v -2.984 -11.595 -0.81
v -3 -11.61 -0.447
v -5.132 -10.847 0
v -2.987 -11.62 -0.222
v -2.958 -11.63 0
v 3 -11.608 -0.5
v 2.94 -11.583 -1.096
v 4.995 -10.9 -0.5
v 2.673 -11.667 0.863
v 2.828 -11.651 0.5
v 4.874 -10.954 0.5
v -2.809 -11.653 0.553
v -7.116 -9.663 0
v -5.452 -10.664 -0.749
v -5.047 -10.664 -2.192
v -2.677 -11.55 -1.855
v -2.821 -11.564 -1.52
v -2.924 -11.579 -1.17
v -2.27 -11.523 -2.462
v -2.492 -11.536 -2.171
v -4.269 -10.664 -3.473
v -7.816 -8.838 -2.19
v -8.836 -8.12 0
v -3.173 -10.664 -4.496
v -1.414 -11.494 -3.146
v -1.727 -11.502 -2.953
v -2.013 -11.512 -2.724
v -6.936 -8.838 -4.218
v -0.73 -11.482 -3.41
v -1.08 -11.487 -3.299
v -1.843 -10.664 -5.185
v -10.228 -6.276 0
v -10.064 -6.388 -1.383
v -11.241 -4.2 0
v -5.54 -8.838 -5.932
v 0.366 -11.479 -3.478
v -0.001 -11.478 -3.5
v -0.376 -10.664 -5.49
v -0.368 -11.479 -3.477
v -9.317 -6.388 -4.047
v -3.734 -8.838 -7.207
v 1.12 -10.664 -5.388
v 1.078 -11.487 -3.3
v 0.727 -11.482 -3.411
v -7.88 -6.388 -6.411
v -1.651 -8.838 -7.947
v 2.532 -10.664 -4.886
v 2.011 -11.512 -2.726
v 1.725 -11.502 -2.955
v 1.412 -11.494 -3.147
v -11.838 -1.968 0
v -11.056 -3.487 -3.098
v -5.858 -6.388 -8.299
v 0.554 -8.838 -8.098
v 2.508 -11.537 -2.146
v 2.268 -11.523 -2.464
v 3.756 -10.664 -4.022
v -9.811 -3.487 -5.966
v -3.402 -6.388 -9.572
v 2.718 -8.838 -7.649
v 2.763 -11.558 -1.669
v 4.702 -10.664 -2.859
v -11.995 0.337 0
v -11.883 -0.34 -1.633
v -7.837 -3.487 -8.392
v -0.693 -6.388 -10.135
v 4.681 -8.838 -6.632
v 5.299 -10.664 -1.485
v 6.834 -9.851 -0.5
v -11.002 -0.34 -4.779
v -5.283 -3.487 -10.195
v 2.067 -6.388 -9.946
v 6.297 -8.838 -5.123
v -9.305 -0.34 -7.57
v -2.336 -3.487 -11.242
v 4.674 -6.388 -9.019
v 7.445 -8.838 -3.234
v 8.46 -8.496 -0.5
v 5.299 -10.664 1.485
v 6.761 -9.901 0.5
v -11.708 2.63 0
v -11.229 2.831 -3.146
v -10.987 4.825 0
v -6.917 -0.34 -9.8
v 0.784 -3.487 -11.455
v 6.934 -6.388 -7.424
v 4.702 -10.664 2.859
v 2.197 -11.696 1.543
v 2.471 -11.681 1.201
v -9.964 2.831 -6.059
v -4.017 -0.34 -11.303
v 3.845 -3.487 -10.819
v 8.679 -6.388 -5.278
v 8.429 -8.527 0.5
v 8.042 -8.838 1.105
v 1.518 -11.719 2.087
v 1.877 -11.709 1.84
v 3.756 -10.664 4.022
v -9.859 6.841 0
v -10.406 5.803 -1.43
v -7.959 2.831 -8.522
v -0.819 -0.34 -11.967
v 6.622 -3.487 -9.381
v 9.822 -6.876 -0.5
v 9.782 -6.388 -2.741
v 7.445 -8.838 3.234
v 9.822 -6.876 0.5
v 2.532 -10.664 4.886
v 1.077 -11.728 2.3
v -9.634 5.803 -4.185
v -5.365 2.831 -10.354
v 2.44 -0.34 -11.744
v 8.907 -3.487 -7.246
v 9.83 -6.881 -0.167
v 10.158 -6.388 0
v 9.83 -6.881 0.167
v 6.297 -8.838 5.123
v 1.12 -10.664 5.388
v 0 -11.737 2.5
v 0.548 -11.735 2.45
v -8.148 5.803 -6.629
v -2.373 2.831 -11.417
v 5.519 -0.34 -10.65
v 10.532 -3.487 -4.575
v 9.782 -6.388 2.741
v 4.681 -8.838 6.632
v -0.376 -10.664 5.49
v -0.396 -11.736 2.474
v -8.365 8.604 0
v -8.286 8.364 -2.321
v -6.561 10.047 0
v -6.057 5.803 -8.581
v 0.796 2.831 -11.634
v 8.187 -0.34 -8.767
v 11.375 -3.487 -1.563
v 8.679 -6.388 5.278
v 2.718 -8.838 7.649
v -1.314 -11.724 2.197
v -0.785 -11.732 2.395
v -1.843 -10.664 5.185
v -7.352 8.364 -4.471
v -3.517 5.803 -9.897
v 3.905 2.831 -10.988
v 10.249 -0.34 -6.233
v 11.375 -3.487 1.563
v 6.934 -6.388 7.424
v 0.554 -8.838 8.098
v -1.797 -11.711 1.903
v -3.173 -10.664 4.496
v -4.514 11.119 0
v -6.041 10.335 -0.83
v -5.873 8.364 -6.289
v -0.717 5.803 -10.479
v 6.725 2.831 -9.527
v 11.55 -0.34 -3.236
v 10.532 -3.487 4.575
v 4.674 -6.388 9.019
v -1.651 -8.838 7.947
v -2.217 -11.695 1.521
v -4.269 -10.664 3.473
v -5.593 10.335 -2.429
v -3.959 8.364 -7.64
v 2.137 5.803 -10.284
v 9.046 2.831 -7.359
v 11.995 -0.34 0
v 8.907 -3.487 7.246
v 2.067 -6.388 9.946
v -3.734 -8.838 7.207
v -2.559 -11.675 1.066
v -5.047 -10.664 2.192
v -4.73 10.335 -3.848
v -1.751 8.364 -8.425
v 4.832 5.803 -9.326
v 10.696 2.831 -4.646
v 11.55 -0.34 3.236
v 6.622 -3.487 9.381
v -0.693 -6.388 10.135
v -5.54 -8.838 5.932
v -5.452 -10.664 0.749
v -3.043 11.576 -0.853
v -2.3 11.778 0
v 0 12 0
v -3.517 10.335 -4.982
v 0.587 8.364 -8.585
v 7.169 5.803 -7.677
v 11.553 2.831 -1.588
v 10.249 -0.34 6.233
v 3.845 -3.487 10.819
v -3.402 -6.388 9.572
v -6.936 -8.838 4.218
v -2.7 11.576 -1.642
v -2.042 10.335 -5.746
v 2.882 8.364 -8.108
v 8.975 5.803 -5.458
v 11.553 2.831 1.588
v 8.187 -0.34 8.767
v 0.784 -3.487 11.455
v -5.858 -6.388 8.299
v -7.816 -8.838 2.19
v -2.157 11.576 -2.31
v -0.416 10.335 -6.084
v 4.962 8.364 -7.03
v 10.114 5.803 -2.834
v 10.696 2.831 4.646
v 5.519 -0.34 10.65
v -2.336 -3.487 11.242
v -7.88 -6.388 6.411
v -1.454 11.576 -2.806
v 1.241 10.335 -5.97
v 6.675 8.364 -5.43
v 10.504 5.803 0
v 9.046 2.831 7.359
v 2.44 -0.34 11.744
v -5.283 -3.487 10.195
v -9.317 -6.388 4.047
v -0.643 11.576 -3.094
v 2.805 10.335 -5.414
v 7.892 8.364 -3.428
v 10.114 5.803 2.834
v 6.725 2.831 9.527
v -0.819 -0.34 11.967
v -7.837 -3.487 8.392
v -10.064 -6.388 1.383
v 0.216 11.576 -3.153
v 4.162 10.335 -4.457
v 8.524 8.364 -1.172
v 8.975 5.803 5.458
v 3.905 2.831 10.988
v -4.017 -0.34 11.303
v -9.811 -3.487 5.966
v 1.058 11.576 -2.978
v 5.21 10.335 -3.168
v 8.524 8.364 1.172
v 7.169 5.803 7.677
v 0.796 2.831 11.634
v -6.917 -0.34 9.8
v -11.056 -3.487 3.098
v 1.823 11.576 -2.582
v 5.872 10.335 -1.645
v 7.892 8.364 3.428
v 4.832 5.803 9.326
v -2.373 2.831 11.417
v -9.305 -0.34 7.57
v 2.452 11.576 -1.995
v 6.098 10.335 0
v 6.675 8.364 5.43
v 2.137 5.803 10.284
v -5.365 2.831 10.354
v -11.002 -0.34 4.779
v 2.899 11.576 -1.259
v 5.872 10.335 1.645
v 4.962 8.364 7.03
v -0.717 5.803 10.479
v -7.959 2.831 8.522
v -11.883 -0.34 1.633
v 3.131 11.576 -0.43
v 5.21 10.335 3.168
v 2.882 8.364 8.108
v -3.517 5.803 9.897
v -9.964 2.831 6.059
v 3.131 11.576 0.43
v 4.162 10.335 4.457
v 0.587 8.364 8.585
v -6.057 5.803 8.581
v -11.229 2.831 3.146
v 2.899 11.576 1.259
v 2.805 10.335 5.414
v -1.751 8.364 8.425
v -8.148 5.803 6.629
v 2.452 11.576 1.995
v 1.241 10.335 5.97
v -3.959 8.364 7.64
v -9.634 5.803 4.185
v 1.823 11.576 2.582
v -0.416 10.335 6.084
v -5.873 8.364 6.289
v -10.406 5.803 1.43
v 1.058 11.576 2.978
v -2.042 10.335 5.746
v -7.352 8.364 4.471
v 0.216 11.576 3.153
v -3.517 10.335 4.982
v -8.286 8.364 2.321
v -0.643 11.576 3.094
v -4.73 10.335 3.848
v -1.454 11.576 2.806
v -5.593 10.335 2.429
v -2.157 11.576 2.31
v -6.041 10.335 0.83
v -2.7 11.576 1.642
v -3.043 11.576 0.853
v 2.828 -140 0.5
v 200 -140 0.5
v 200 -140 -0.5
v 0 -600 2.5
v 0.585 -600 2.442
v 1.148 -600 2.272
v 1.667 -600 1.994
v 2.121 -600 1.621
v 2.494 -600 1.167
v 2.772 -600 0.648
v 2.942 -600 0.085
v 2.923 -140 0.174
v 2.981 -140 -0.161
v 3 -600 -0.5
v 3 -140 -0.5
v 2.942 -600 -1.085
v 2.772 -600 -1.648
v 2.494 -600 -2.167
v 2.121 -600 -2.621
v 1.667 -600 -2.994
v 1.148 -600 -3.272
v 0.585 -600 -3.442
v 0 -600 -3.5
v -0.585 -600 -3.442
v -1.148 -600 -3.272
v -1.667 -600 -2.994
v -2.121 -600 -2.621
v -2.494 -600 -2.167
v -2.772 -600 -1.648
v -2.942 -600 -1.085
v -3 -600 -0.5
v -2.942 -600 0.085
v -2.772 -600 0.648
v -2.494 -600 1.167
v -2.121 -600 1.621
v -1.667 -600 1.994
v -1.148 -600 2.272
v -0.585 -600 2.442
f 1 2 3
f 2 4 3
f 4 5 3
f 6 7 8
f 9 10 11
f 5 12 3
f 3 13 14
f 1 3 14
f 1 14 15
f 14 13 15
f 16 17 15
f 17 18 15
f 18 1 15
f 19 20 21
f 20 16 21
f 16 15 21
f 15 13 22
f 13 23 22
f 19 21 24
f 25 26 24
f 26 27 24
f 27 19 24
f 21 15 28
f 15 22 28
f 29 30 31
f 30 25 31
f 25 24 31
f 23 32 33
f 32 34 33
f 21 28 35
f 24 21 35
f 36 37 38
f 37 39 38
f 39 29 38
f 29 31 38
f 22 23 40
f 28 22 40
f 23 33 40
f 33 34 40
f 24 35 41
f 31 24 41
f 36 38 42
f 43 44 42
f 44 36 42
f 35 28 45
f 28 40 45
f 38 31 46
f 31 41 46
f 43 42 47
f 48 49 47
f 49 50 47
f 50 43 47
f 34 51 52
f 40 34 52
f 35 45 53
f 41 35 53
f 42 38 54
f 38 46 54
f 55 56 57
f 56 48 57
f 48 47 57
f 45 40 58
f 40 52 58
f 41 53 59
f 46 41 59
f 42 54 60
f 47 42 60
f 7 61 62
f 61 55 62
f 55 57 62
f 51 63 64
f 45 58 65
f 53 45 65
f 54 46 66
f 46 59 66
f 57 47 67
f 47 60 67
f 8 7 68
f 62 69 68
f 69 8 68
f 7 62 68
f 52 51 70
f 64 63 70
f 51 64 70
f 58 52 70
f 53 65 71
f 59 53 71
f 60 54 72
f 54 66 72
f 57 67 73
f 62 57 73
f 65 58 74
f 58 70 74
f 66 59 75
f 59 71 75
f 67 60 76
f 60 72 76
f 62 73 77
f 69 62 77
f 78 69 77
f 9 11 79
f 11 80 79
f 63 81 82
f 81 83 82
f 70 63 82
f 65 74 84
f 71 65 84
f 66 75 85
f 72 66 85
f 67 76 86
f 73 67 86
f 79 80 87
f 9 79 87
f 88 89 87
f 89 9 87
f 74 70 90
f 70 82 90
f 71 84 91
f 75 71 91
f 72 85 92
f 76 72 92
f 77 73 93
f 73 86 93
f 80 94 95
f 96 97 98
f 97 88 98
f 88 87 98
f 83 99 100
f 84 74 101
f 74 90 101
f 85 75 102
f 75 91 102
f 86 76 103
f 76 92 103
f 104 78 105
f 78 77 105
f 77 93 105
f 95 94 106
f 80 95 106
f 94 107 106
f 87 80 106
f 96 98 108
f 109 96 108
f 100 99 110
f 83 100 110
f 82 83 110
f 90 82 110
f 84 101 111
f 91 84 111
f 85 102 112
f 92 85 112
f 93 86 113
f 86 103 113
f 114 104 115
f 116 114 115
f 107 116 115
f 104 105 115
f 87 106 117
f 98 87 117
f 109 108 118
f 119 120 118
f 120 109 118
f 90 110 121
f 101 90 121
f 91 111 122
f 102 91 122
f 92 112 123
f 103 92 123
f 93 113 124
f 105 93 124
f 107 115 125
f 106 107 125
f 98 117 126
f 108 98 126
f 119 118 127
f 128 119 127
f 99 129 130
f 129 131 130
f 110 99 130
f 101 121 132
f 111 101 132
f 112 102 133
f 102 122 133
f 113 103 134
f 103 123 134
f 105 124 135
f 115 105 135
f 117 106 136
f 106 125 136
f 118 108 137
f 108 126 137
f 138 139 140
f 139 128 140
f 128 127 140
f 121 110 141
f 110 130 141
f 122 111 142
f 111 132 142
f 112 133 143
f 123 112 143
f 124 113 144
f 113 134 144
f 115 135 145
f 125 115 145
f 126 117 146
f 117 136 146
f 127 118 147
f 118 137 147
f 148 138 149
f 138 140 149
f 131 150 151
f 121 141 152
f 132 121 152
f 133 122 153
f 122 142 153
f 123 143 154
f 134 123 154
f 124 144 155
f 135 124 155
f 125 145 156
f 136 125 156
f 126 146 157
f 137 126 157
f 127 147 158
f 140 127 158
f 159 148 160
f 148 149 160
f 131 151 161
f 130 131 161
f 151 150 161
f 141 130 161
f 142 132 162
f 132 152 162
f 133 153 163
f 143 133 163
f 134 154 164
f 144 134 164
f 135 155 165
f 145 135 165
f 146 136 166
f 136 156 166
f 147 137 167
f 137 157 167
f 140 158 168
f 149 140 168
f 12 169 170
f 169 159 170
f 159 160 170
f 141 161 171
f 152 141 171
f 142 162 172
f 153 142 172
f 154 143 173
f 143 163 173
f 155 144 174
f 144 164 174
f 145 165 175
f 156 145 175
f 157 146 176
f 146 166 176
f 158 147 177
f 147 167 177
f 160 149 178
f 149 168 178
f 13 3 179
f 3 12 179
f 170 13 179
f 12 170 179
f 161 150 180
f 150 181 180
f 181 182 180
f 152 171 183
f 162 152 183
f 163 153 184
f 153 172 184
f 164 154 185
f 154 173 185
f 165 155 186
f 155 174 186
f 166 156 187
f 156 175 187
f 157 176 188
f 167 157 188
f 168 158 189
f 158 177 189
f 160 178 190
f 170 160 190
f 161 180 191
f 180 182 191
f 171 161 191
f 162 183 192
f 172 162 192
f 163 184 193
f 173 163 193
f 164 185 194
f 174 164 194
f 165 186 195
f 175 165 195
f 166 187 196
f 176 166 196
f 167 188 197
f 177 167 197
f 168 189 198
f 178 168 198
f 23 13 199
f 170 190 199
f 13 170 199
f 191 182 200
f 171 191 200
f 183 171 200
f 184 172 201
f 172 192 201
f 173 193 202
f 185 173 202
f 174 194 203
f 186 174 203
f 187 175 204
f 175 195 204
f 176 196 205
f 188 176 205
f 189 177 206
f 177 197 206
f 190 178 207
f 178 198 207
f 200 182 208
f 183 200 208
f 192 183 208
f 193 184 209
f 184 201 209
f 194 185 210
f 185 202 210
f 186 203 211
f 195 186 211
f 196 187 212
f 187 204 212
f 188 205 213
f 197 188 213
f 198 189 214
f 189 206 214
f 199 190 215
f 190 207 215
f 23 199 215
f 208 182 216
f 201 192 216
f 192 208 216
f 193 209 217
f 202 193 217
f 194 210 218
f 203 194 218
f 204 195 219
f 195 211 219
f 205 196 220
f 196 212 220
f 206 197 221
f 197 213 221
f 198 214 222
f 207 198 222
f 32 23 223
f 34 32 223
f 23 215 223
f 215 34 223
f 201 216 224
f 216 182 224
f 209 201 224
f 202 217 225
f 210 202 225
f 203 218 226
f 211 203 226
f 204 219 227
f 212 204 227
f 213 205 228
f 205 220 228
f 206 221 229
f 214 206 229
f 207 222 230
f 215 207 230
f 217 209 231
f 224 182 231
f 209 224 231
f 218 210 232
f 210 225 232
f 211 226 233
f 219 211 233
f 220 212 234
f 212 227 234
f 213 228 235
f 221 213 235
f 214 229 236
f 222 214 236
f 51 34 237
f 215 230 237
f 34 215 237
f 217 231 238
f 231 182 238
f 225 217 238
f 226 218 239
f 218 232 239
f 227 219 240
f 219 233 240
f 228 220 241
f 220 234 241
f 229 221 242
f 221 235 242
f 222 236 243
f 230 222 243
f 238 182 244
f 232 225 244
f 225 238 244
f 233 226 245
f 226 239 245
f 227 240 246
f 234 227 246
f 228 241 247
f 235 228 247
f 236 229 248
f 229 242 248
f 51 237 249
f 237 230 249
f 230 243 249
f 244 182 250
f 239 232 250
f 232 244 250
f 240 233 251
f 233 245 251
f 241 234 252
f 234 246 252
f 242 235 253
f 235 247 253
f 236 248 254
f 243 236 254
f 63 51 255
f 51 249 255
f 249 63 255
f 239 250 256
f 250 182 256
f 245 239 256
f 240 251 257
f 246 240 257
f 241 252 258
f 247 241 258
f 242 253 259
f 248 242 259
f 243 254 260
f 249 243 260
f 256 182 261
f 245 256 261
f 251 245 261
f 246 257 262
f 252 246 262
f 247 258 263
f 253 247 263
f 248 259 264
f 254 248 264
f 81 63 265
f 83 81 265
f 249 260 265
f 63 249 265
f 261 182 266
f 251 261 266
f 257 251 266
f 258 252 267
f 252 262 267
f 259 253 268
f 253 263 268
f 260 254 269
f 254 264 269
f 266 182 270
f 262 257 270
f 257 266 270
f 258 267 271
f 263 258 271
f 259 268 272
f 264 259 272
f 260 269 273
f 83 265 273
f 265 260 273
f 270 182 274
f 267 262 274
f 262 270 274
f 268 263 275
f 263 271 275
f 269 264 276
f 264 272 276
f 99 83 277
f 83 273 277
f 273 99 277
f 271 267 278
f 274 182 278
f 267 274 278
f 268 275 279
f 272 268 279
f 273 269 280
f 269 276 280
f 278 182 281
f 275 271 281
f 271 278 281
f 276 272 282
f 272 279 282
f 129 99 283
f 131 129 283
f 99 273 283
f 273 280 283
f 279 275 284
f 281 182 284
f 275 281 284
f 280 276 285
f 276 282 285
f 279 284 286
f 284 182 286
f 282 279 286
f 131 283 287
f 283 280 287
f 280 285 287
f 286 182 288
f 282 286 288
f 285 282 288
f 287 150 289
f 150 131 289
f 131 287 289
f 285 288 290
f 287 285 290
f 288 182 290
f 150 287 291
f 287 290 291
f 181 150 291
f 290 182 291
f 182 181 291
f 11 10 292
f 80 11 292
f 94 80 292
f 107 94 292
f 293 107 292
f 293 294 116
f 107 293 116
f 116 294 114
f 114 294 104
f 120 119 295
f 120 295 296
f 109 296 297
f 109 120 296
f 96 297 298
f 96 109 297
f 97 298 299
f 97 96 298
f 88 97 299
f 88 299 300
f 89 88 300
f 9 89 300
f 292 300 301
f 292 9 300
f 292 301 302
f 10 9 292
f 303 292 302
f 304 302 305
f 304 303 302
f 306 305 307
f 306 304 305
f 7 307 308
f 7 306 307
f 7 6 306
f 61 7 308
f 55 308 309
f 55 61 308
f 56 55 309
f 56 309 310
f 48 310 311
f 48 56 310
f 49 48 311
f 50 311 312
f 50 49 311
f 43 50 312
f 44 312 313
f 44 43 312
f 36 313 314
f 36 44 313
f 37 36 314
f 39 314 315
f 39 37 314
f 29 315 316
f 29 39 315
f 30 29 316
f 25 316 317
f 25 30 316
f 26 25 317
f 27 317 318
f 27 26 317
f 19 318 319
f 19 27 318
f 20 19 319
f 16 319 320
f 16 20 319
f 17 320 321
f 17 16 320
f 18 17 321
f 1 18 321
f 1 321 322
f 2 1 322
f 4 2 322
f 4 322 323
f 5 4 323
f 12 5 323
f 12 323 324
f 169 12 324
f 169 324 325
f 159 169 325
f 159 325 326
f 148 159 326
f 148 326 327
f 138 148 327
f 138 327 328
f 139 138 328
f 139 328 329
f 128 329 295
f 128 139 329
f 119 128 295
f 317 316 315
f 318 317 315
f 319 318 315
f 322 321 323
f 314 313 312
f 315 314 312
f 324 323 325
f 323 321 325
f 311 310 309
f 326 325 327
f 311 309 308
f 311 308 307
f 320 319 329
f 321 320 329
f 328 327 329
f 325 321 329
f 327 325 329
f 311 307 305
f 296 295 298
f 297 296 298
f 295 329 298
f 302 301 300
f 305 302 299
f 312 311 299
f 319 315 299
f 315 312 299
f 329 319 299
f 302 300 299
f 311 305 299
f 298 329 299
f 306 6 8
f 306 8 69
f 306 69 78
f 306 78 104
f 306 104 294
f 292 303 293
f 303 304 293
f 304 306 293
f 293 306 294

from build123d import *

# Parameters (mm, degrees)
BOSS_EXTRUDE1_DEPTH      = 0.5
BOSS_EXTRUDE1_DEPTH_BACK = 0.5
SKETCH2_R                = 3
BOSS_EXTRUDE2_DEPTH      = 600


with BuildPart() as part:
    # Sketch1 → Boss-Extrude1 (new, two sides: drawn at the far end of the back side and taken through both)
    with BuildSketch(Plane.XY.offset(-BOSS_EXTRUDE1_DEPTH_BACK)):
        Polygon((0, 0), (0, -140), (200, -140), align=None)
    extrude(amount=BOSS_EXTRUDE1_DEPTH + BOSS_EXTRUDE1_DEPTH_BACK)

    # Sketch2 → Boss-Extrude2 (add)
    with BuildSketch(Plane(origin=(0, 0, 0), x_dir=(1, 0, 0), z_dir=(0, 1, 0))):
        with Locations((0, 0.5)):
            Circle(SKETCH2_R)
    extrude(amount=-BOSS_EXTRUDE2_DEPTH)

    # Sketch3 → Revolve1 (revolve)
    with BuildSketch(Plane.XY):
        with BuildLine():
            Line((0, 12), (0, -12))
            ThreePointArc((0, -12), (-12, 0), (0, 12))
        make_face()
    revolve(axis=Axis((0, 12, 0), (0, -1, 0)))


solid = part.part
